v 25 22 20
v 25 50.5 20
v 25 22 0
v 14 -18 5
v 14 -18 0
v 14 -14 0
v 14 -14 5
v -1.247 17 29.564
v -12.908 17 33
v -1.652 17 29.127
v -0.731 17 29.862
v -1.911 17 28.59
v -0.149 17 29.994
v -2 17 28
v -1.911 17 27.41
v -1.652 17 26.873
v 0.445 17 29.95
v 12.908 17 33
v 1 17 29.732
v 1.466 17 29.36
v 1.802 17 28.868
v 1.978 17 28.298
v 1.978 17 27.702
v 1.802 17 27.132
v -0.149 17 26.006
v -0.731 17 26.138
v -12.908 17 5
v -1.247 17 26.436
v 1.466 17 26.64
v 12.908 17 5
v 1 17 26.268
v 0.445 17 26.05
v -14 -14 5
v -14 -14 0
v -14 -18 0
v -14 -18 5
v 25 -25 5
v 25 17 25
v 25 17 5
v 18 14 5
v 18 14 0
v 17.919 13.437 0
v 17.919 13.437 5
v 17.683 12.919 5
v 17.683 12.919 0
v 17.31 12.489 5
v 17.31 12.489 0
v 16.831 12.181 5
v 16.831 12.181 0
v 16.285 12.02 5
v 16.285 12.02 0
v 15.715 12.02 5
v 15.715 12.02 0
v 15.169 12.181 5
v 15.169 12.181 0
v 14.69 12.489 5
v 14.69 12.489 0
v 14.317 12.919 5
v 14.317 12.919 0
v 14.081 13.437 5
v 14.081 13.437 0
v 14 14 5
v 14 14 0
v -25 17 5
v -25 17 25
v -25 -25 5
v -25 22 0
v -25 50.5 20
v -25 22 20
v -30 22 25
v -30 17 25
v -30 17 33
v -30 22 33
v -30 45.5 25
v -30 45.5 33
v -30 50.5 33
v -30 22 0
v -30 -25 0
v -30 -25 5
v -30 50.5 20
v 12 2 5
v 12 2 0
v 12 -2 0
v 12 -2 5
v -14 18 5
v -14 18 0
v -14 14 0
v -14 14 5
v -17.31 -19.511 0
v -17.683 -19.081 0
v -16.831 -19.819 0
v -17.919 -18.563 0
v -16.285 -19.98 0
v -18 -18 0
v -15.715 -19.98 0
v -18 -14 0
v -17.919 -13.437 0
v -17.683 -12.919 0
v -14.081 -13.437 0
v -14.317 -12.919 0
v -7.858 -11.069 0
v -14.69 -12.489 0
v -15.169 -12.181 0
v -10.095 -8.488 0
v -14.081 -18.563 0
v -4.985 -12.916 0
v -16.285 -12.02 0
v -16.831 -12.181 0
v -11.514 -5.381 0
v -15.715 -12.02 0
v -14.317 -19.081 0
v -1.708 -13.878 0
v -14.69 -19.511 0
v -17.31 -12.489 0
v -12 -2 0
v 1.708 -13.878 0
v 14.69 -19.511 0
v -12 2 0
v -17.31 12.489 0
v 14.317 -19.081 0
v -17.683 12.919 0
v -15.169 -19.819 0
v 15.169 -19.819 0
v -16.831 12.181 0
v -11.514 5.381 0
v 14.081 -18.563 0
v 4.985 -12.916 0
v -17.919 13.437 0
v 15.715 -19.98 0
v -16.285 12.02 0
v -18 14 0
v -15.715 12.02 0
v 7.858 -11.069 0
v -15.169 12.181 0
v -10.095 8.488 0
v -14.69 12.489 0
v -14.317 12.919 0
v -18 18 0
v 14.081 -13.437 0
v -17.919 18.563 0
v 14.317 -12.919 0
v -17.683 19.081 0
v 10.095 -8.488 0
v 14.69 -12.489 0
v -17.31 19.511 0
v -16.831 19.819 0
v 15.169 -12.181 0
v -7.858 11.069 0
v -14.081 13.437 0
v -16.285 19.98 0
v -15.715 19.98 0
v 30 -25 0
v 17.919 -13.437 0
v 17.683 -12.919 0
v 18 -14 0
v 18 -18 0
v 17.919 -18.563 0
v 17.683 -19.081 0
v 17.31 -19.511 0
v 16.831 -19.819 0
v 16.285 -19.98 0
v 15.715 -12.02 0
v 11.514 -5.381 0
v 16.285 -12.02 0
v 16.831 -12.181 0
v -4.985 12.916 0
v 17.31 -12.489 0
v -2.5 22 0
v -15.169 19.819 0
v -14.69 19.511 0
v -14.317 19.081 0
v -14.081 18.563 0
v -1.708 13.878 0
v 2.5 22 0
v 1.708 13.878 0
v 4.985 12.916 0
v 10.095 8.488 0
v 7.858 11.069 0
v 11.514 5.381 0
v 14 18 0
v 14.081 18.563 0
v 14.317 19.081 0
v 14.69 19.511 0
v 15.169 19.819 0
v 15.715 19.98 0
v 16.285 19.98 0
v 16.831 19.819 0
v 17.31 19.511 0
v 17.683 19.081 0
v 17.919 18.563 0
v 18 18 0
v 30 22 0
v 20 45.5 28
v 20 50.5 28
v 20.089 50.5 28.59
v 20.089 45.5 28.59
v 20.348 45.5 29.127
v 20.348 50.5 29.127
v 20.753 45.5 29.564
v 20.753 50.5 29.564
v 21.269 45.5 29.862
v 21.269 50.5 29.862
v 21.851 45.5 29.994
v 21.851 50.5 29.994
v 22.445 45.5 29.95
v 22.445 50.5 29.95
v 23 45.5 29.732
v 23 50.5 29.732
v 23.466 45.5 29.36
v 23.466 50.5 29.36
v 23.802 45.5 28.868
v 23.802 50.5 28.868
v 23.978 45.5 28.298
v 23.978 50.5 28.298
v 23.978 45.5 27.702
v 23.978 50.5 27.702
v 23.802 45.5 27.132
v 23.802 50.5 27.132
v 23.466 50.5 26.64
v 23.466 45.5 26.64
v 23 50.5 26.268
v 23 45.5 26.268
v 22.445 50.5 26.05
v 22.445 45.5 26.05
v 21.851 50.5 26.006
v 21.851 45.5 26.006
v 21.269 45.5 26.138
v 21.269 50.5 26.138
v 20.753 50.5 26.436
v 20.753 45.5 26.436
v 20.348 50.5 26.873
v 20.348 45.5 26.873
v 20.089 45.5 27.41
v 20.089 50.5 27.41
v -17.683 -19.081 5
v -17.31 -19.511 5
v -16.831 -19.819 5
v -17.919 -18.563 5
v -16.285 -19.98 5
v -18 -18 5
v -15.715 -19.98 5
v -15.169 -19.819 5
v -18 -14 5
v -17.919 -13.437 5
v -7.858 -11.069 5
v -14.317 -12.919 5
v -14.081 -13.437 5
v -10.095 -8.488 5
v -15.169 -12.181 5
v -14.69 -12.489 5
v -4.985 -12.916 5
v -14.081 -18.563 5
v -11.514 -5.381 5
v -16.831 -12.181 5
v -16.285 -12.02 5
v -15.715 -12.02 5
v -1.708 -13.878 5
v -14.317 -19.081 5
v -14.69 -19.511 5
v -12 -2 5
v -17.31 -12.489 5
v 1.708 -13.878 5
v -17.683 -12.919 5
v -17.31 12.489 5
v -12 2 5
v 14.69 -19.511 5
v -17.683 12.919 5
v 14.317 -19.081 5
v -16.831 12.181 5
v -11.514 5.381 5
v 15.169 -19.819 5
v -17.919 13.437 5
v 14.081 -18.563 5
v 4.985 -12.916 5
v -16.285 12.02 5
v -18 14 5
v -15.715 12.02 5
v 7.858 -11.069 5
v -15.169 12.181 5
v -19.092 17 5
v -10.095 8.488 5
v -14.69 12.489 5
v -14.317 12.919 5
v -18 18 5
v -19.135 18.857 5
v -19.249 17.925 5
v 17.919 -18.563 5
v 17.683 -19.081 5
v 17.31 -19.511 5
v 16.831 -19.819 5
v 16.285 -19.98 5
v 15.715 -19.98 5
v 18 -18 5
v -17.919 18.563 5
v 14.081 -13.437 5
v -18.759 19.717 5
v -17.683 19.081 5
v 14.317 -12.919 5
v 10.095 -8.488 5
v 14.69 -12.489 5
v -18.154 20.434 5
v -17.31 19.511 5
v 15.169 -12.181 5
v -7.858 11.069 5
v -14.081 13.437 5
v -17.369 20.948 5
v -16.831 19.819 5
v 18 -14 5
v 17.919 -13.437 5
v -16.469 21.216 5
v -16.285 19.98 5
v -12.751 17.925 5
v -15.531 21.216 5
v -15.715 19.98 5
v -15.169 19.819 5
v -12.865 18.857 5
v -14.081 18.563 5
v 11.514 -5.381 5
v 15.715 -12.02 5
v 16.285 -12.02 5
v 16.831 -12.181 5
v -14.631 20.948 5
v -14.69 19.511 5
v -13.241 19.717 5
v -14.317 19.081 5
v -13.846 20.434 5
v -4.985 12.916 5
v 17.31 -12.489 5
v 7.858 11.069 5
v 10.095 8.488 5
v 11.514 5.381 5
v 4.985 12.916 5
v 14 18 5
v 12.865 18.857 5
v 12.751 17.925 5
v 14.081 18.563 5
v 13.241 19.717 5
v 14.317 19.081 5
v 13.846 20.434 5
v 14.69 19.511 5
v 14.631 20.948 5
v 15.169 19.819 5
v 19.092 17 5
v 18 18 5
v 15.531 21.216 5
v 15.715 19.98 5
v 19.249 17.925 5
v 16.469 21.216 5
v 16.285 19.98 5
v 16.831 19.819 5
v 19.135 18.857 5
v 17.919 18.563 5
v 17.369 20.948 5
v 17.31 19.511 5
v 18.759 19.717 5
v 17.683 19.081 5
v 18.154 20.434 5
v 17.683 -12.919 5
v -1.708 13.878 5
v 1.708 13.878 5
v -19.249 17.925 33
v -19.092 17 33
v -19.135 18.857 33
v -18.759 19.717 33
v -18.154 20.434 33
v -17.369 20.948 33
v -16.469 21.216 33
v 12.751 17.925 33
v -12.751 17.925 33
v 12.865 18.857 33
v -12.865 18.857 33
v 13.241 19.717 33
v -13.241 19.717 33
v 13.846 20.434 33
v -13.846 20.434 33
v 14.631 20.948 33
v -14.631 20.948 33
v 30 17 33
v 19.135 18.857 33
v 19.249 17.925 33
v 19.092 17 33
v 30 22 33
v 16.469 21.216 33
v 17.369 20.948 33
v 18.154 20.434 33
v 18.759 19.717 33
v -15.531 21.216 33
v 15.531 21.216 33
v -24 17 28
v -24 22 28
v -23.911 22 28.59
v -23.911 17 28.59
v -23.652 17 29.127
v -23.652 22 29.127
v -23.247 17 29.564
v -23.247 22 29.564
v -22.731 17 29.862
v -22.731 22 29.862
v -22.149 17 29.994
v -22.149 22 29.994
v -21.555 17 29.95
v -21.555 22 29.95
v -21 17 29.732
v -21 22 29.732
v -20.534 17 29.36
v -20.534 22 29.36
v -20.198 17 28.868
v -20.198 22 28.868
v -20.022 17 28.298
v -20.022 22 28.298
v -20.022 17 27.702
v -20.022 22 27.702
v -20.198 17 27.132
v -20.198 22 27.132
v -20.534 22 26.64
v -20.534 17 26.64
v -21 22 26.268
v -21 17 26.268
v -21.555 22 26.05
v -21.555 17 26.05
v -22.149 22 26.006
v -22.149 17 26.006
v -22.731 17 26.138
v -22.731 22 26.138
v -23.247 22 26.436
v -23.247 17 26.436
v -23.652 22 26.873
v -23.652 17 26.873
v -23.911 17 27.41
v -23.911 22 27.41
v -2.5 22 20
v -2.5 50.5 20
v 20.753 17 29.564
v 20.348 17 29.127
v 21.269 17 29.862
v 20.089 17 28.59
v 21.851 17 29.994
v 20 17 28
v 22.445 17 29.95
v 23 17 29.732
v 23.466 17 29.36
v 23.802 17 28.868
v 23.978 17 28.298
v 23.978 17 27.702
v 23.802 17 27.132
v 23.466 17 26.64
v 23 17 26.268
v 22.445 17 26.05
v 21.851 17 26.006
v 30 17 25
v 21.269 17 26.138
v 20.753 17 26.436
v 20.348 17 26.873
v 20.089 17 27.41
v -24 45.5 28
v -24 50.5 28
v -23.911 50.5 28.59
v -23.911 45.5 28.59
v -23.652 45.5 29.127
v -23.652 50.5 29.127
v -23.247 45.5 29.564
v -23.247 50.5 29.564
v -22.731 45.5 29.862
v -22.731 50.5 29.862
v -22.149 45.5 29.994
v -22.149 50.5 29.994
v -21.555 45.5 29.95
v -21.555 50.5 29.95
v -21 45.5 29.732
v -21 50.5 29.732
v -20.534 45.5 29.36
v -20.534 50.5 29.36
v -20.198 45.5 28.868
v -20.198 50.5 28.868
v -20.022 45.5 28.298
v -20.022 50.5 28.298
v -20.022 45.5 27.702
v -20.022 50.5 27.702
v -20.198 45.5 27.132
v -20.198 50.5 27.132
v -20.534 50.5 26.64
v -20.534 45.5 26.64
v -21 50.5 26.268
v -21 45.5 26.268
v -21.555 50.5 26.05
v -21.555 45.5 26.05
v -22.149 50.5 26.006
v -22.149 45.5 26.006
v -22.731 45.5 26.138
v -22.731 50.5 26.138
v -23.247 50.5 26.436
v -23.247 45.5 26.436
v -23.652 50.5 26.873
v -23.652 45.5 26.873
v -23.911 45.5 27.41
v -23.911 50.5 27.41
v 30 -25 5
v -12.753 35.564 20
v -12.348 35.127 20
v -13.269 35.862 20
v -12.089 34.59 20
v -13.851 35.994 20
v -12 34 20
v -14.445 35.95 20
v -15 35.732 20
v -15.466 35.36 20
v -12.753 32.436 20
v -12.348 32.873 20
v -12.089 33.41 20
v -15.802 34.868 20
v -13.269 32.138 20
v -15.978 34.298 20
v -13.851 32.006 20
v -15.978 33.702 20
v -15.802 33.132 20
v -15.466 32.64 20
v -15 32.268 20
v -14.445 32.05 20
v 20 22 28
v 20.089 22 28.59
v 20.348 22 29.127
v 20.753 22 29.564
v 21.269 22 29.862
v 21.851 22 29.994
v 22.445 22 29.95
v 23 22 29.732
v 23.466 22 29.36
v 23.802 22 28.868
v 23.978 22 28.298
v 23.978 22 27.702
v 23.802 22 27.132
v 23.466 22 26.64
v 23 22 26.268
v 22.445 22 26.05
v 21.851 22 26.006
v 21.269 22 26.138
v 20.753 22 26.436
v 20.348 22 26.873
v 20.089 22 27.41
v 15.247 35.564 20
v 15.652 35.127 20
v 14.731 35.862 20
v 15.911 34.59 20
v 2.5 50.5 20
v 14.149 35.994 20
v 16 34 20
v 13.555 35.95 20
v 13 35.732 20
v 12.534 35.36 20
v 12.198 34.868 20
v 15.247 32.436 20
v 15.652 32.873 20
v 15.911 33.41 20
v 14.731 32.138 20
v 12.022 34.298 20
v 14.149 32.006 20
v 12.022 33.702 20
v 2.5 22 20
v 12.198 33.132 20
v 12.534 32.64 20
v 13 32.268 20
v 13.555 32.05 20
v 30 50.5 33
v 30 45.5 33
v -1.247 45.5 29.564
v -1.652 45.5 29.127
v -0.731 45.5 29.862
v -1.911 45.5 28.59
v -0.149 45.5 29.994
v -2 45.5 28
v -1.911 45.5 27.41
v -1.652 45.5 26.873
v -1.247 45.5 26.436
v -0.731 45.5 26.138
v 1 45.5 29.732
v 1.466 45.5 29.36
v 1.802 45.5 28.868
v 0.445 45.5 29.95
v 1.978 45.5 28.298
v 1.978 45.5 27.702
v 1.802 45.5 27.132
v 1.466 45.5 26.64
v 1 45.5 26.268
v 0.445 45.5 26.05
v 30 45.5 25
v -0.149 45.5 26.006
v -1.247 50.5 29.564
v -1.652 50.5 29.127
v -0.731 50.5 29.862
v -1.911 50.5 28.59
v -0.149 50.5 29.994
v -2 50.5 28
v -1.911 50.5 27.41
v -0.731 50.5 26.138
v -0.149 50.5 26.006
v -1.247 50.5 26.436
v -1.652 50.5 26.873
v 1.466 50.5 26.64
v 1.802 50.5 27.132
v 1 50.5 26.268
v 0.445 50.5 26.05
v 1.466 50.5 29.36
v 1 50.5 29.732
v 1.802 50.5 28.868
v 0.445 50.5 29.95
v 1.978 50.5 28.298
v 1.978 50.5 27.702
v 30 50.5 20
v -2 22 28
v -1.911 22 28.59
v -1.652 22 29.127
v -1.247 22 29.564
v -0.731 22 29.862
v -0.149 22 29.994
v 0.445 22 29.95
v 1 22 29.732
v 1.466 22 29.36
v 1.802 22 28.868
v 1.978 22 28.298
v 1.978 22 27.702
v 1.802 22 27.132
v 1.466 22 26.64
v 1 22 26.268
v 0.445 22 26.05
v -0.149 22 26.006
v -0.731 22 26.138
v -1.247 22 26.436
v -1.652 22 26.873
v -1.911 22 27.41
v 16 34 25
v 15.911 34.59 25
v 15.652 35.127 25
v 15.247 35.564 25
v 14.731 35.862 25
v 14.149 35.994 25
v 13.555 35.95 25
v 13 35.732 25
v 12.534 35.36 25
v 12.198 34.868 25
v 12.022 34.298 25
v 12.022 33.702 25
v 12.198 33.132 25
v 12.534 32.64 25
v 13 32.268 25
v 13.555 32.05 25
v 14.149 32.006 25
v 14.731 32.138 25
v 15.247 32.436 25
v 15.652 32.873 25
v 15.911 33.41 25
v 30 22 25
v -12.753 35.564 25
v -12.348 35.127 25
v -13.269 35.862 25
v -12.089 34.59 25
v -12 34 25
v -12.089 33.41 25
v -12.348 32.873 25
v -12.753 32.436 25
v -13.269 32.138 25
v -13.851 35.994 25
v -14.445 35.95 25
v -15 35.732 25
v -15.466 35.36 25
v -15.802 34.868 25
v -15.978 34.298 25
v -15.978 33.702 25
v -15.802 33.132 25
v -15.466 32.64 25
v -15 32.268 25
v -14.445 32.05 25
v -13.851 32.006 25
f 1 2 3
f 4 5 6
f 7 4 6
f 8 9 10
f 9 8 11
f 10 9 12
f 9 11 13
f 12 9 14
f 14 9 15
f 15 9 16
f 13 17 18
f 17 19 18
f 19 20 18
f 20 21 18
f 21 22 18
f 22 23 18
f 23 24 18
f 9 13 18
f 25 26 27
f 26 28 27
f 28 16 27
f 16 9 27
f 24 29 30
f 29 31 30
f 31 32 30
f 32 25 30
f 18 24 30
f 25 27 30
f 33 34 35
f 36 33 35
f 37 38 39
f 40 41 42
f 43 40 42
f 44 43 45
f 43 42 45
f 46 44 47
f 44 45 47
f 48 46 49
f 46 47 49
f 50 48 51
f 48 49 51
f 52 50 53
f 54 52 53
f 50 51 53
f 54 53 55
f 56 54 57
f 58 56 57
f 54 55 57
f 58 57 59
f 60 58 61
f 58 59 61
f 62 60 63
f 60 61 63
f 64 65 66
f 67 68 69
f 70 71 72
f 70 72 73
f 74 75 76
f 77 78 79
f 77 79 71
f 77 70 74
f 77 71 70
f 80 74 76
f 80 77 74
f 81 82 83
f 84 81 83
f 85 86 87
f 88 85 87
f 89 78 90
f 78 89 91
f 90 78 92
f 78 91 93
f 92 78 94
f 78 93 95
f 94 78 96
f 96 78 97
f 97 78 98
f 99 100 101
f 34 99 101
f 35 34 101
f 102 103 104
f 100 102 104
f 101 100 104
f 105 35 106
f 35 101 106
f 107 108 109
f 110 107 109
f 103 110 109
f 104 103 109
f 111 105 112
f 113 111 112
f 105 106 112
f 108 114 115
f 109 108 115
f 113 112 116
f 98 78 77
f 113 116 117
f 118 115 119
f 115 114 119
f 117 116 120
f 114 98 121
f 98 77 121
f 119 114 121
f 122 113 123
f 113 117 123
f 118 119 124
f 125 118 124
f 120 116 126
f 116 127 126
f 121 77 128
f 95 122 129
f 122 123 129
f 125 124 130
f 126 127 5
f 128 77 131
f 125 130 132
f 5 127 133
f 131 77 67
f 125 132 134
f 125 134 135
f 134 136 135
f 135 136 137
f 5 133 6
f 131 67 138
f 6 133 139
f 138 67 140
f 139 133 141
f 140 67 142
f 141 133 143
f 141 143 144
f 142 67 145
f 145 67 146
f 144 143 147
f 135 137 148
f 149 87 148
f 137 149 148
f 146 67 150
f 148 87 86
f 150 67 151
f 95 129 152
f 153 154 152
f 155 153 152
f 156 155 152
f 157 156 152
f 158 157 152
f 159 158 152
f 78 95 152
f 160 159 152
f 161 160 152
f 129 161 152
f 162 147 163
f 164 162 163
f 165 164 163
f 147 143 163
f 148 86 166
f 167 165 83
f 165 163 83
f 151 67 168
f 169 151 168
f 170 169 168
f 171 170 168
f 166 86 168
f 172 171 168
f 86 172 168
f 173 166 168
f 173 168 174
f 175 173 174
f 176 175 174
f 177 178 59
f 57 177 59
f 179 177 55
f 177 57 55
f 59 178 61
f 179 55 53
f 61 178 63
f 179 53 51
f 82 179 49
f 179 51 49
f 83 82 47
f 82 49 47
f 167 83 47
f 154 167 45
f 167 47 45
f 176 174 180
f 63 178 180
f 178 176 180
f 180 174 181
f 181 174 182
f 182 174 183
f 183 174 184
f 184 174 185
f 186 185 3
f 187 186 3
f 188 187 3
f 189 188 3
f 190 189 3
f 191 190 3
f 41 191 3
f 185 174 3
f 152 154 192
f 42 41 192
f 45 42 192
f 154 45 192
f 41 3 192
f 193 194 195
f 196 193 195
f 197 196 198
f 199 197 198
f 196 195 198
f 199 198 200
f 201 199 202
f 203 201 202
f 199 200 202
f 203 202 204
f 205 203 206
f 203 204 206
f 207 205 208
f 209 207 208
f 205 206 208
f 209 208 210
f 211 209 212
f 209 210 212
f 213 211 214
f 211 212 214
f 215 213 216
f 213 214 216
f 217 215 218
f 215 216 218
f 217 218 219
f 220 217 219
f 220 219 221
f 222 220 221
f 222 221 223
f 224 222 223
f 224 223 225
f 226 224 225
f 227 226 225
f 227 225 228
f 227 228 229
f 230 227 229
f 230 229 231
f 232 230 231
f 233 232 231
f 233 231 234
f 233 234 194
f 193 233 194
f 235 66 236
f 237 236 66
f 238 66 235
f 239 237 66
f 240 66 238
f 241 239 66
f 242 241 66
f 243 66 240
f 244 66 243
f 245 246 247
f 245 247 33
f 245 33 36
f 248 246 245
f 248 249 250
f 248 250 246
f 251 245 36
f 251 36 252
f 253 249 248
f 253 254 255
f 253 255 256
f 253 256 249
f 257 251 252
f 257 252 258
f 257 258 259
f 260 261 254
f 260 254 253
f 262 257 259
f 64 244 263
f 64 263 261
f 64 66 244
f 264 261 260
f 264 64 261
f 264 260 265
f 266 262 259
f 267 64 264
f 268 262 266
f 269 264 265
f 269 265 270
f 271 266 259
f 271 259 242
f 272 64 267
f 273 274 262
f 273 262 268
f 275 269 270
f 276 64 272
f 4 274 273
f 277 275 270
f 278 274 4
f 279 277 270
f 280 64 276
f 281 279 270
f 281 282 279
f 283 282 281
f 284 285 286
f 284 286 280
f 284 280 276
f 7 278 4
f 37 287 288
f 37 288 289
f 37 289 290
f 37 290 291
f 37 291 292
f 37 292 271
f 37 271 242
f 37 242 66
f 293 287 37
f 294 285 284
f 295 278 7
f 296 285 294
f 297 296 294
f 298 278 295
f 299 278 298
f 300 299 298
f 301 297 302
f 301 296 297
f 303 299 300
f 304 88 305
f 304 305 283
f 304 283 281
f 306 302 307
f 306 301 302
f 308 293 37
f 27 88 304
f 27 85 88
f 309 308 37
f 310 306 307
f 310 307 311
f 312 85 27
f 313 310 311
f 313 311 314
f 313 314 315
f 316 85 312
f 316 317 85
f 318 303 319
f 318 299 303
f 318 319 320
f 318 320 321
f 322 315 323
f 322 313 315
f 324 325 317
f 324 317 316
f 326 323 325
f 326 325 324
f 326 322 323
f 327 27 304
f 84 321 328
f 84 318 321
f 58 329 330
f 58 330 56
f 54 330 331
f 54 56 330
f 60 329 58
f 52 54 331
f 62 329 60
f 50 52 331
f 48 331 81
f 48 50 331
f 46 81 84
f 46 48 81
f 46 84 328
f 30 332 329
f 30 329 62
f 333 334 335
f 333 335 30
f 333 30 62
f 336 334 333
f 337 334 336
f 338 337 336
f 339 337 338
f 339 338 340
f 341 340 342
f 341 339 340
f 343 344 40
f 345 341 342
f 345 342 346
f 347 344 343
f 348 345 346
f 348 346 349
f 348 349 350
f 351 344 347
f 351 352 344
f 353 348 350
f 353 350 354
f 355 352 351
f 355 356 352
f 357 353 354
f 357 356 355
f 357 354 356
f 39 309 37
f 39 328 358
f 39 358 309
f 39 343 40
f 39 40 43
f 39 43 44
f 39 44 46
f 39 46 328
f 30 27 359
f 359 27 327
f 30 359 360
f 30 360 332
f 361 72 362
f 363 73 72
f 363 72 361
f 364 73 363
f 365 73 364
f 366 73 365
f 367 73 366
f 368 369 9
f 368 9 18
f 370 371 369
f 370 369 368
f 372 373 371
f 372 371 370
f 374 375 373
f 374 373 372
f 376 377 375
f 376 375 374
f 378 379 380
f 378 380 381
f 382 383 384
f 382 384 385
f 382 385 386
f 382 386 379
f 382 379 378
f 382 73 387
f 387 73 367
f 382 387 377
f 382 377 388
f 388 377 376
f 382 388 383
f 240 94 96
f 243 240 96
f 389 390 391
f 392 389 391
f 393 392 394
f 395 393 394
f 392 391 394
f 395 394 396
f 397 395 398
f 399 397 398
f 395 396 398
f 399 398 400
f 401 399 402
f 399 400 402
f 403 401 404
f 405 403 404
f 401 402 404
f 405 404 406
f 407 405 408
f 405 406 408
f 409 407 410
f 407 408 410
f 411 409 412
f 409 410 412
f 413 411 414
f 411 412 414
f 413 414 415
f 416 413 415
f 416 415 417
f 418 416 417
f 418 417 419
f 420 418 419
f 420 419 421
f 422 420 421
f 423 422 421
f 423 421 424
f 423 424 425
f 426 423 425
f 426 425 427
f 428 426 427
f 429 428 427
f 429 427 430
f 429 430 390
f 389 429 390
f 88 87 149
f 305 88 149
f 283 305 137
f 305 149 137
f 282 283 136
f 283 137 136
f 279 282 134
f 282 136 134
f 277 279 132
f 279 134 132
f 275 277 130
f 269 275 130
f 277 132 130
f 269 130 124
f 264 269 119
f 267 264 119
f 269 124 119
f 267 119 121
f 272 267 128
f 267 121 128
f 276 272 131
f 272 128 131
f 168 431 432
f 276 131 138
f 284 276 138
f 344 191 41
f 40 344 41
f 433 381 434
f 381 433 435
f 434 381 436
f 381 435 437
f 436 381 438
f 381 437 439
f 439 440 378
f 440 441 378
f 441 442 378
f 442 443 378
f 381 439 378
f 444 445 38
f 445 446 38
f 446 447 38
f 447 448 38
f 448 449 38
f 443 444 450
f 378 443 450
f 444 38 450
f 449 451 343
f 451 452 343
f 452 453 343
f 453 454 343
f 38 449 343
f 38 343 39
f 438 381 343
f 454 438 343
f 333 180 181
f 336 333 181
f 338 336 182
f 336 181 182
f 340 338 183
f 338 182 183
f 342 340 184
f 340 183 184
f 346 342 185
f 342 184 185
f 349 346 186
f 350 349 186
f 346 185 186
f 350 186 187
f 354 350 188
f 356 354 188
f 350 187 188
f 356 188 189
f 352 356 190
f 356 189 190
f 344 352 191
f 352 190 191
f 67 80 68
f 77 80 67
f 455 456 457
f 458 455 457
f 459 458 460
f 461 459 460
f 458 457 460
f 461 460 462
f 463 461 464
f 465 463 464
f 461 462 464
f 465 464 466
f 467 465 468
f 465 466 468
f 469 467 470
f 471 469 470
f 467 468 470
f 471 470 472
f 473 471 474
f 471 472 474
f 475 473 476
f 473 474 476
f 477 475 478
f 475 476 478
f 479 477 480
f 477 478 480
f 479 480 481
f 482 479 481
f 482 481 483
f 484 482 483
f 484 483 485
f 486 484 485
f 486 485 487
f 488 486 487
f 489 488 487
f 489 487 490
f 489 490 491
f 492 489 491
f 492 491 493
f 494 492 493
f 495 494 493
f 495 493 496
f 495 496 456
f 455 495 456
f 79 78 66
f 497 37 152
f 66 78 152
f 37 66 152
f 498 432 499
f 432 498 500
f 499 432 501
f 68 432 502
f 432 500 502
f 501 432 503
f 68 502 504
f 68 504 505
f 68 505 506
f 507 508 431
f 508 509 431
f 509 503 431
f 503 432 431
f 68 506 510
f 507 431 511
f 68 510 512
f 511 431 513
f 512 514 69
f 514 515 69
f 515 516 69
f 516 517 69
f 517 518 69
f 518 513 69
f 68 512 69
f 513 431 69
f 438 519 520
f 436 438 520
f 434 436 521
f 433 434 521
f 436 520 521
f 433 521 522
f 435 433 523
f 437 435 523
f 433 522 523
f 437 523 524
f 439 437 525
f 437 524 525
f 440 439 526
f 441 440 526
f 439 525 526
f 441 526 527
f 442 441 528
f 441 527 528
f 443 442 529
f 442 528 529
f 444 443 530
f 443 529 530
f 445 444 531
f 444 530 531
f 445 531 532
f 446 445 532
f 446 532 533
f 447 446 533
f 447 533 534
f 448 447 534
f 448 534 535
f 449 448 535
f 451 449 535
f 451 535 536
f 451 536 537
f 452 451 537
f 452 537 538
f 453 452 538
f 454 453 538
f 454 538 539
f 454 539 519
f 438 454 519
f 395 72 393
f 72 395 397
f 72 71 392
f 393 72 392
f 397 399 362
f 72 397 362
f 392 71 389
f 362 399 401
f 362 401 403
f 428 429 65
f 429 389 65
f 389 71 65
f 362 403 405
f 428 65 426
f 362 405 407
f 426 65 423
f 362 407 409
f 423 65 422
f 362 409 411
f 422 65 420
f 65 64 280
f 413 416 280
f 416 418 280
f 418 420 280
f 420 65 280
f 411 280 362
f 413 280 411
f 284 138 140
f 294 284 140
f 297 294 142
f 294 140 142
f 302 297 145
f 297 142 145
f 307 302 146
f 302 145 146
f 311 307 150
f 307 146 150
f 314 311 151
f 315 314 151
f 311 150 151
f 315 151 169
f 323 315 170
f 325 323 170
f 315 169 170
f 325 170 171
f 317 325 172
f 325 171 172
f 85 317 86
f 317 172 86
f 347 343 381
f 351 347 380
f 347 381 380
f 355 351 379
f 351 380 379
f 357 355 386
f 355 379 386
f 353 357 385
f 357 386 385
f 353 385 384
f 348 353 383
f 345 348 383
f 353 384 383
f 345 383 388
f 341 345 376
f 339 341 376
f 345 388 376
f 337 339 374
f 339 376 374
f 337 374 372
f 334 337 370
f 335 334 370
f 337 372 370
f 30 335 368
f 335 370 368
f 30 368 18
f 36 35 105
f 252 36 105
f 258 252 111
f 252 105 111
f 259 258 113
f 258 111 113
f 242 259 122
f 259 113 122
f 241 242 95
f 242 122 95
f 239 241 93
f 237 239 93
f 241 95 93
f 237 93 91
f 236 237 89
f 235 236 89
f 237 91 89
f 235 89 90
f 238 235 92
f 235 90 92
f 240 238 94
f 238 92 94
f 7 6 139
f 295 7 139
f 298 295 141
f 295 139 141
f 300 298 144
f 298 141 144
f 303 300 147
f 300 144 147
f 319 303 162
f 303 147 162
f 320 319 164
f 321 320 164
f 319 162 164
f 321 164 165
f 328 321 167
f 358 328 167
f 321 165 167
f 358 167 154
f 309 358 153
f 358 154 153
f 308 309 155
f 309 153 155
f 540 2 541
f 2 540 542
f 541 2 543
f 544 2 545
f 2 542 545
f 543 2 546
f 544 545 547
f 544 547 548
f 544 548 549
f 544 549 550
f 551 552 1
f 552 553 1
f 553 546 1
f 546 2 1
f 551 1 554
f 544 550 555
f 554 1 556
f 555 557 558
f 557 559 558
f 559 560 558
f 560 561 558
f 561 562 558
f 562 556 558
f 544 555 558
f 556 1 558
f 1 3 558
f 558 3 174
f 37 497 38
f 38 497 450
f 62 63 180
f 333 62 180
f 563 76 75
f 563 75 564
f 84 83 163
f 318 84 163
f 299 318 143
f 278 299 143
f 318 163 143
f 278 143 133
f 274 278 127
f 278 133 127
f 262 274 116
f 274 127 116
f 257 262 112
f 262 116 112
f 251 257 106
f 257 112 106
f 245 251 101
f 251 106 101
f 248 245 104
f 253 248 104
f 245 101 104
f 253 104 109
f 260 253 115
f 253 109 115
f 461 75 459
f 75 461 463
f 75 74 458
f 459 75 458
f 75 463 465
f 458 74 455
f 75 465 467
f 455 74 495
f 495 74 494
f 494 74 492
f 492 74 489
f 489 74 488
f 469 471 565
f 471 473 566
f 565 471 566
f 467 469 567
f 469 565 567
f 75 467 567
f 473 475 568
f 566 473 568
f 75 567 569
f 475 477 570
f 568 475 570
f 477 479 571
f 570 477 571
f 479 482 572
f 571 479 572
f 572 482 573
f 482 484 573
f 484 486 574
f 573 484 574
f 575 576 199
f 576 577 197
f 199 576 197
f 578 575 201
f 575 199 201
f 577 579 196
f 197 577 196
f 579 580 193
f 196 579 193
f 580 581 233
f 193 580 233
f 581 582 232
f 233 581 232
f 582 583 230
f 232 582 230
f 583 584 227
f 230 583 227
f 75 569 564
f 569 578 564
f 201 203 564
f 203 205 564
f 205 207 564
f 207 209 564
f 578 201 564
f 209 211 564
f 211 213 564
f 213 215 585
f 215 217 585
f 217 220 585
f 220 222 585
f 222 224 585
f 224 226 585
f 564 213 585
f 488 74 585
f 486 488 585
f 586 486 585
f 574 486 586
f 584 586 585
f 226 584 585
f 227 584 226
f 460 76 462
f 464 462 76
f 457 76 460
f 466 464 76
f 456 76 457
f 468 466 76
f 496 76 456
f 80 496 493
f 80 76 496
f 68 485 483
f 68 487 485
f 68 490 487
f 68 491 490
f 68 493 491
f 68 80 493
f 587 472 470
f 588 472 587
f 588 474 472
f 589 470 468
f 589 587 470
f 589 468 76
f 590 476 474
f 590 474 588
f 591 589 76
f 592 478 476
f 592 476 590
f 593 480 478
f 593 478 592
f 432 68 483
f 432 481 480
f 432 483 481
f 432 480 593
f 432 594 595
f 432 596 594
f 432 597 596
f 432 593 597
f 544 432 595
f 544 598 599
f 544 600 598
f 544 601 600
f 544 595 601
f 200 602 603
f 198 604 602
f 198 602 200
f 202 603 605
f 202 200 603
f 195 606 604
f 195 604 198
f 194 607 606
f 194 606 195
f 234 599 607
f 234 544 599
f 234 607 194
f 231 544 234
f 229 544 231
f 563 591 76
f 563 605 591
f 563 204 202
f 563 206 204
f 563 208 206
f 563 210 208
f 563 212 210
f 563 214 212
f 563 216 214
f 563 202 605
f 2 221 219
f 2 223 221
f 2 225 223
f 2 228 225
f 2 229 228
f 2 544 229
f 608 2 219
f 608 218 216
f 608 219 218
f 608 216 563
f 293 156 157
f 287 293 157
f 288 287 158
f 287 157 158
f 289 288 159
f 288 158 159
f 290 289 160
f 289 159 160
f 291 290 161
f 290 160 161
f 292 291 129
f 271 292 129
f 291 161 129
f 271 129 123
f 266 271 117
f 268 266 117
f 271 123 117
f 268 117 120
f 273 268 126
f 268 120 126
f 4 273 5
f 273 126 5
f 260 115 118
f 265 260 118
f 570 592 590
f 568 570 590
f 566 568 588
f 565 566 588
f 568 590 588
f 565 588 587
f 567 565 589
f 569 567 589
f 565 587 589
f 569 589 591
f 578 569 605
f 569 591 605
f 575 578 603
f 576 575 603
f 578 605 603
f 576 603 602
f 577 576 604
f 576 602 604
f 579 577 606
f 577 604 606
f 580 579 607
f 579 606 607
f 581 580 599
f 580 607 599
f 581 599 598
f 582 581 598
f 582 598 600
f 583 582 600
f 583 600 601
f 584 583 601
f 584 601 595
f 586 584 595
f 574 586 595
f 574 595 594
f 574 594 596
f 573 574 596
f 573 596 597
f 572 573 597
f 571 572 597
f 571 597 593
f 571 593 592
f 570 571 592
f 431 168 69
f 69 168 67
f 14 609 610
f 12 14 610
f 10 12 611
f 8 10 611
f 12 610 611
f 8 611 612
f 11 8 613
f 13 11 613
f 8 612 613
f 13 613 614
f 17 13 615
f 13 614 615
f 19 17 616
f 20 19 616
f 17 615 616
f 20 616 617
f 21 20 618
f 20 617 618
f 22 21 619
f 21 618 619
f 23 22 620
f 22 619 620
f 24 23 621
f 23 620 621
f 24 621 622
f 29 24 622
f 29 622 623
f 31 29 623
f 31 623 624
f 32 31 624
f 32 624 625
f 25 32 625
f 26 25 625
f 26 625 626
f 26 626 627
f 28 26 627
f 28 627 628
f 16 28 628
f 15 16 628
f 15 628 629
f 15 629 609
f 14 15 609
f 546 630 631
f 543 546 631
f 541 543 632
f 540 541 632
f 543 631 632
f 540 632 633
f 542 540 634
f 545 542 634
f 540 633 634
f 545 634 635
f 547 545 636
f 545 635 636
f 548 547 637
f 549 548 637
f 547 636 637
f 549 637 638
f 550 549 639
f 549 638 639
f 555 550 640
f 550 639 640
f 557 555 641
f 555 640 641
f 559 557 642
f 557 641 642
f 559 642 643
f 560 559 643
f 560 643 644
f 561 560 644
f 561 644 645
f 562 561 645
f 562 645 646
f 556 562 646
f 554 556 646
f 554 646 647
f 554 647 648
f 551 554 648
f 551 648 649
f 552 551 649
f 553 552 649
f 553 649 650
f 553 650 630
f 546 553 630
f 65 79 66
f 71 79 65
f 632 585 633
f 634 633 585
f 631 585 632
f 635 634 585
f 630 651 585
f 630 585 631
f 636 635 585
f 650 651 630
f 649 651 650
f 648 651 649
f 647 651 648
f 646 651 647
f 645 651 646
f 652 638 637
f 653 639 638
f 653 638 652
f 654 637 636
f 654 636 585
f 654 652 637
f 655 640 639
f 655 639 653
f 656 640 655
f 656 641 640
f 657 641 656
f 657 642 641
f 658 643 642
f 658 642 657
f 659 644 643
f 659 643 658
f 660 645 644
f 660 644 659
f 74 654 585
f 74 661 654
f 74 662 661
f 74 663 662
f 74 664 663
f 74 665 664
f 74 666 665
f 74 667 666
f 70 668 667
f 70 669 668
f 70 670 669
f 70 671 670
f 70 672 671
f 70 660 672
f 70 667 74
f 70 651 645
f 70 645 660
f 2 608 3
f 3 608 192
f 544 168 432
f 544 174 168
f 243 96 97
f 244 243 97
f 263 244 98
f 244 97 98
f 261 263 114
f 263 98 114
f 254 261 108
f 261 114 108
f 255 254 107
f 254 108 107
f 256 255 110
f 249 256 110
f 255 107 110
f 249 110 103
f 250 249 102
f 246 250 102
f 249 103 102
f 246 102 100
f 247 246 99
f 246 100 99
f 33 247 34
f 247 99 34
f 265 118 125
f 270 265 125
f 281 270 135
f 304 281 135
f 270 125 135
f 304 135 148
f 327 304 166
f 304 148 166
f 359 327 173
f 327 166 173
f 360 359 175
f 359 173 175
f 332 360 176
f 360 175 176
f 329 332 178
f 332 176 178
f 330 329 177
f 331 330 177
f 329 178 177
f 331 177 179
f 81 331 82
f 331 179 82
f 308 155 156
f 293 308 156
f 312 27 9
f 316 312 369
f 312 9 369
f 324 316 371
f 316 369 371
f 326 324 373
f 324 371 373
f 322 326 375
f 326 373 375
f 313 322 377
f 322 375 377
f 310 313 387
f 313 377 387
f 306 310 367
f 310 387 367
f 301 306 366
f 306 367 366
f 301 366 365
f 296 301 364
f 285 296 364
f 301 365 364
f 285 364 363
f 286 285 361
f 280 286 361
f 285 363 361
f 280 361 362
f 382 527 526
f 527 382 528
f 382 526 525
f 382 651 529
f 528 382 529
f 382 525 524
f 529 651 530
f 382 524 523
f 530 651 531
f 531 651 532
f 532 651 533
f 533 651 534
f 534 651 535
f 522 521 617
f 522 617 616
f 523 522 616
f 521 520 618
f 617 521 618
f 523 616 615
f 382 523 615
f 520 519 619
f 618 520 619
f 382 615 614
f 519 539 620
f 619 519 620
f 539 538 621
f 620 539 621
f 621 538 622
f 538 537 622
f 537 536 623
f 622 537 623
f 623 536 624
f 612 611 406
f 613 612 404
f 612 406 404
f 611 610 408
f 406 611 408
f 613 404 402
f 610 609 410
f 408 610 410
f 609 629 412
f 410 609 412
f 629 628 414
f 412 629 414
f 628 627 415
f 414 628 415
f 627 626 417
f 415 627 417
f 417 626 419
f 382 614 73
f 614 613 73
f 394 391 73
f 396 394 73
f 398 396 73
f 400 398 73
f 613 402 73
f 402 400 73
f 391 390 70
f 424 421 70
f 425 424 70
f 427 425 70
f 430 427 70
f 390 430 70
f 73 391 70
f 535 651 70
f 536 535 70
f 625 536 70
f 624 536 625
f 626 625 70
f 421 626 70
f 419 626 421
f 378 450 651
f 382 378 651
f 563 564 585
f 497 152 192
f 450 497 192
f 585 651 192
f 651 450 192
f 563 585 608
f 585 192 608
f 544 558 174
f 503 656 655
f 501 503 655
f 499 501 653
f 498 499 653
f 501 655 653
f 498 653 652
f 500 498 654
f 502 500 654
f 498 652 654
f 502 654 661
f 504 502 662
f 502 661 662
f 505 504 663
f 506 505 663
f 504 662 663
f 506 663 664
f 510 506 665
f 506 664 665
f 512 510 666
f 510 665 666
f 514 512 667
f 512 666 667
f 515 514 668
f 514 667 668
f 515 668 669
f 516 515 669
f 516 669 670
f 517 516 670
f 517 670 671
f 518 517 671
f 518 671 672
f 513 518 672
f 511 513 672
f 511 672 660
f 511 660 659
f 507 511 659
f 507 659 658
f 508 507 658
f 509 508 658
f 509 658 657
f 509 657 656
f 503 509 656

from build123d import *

# Parameters (mm, degrees)
F0_W           = 60
F0_H           = 47
F1_DEPTH       = 5
F3_DEPTH       = 20
F4_W           = 60
F4_H           = 5
F5_DEPTH       = 28.5
F7_DEPTH       = 5
F9_DEPTH       = 8
F10_W          = 60
F10_H          = 5
F11_DEPTH      = 8
F12_R          = 2
F13_DEPTH      = 25
F15_DEPTH      = 2.5
F15_DEPTH_BACK = 2.5
F16_R          = 2
F17_DEPTH      = 75.501
F18_R          = 3.25
F19_DEPTH      = 28
F20_DEPTH      = 138


# Not quite as in the source:
# - an extrude ends at something that could not be found from the text; its depth is read off the source's solid
# - a pattern or mirror of a feature is missing from the dataset's text; its kind, count and spacing are read off the source's solid
# - a feature names something its author has since deleted; it is built from what else it names


with BuildPart() as f1:
    # F0 (on Top) → F1 (new body)
    with BuildSketch(Plane.XY):
        with Locations((0, -1.5)):
            Rectangle(F0_W, F0_H)
        with BuildLine():
            Line((-14, -14), (-14, -18))
            ThreePointArc((-14, -18), (-16, -20), (-18, -18))
            Line((-18, -18), (-18, -14))
            ThreePointArc((-18, -14), (-16, -12), (-14, -14))
        make_face(mode=Mode.SUBTRACT)
        with BuildLine():
            Line((18, -14), (18, -18))
            ThreePointArc((18, -18), (16, -20), (14, -18))
            Line((14, -18), (14, -14))
            ThreePointArc((14, -14), (16, -12), (18, -14))
        make_face(mode=Mode.SUBTRACT)
        with BuildLine():
            ThreePointArc((-14, 14), (-16, 12), (-18, 14))
            Line((-18, 14), (-18, 18))
            ThreePointArc((-18, 18), (-16, 20), (-14, 18))
            Line((-14, 18), (-14, 14))
        make_face(mode=Mode.SUBTRACT)
        with BuildLine():
            Line((-12, -2), (-12, 2))
            ThreePointArc((-12, 2), (0, 14), (12, 2))
            Line((12, 2), (12, -2))
            ThreePointArc((12, -2), (0, -14), (-12, -2))
        make_face(mode=Mode.SUBTRACT)
        with BuildLine():
            Line((14, 14), (14, 18))
            ThreePointArc((14, 18), (16, 20), (18, 18))
            Line((18, 18), (18, 14))
            ThreePointArc((18, 14), (16, 12), (14, 14))
        make_face(mode=Mode.SUBTRACT)
    extrude(amount=F1_DEPTH)

    # F2 (on face) → F3 (join)
    with BuildSketch(Plane.XY.offset(5)):
        with BuildLine():
            Line((30, 22), (-30, 22))
            Line((-30, 22), (-30, 17))
            Line((-30, 17), (-18, 17))
            Line((-18, 17), (-18, 18))
            ThreePointArc((-18, 18), (-16, 20), (-14, 18))
            Line((-14, 18), (-14, 17))
            Line((-14, 17), (14, 17))
            Line((14, 17), (14, 18))
            ThreePointArc((14, 18), (16, 20), (18, 18))
            Line((18, 18), (18, 17))
            Line((18, 17), (30, 17))
            Line((30, 17), (30, 22))
        make_face()
    extrude(amount=F3_DEPTH)

    # F4 (on face) → F5 (join)
    with BuildSketch(Plane(origin=(0, 22, 0), x_dir=(-1, 0, 0), z_dir=(0, 1, 0))):
        with Locations((0, 22.5)):
            Rectangle(F4_W, F4_H)
    extrude(amount=F5_DEPTH)

    # F6 (on face) → F7 (join)
    with BuildSketch(Plane(origin=(-30, 0, 0), x_dir=(0, -1, 0), z_dir=(-1, 0, 0))):
        Polygon((-22, 20), (-50.5, 20), (-22, 0), align=None)
        Polygon((25, 5), (-17, 25), (-17, 5), align=None)
    f7 = extrude(amount=-F7_DEPTH)

    # F7_copies: F7 across plane
    add(f7.mirror(Plane(origin=(0, 0, 0), x_dir=(0, 0, 1), z_dir=(1, 0, 0))))

    # F8 (on face) → F9 (join)
    with BuildSketch(Plane.XY.offset(25)):
        with BuildLine():
            Line((30, 22), (-30, 22))
            Line((-30, 22), (-30, 17))
            Line((-30, 17), (-25, 17))
            Line((-25, 17), (-18, 17))
            Line((-18, 17), (-18, 18))
            ThreePointArc((-18, 18), (-16, 20), (-14, 18))
            Line((-14, 18), (-14, 17))
            Line((-14, 17), (14, 17))
            Line((14, 17), (14, 18))
            ThreePointArc((14, 18), (16, 20), (18, 18))
            Line((18, 18), (18, 17))
            Line((18, 17), (25, 17))
            Line((25, 17), (30, 17))
            Line((30, 17), (30, 22))
        make_face()
    extrude(amount=F9_DEPTH)

    # F10 (on face) → F11 (join)
    with BuildSketch(Plane.XY.offset(25)):
        with Locations((0, 48)):
            Rectangle(F10_W, F10_H)
    extrude(amount=F11_DEPTH)

    # F12 (on face) → F13 (cut)
    with BuildSketch(Plane.XY.offset(25)):
        with Locations((14, 34)):
            Circle(F12_R)
        with Locations((-14, 34)):
            Circle(F12_R)
    extrude(amount=-F13_DEPTH, mode=Mode.SUBTRACT)

    # F14 (on Right) → F15 (join, two sides)
    with BuildSketch(Plane.YZ) as f15_sk:
        Polygon((22, 20), (22, 0), (50.5, 20), align=None)
    extrude(amount=F15_DEPTH)
    extrude(f15_sk.sketch, amount=-F15_DEPTH_BACK)

    # F16 (on face) → F17 (cut, through all)
    with BuildSketch(Plane(origin=(0, 50.5, 0), x_dir=(-1, 0, 0), z_dir=(0, 1, 0))):
        with Locations((-22, 28)):
            Circle(F16_R)
        with Locations((22, 28)):
            Circle(F16_R)
        with Locations((0, 28)):
            Circle(F16_R)
    extrude(amount=-F17_DEPTH, mode=Mode.SUBTRACT)

    # F18 (on face) → F19 (cut, through all)
    with BuildSketch(Plane.XY.offset(33)):
        with Locations((-16, 18)):
            Circle(F18_R)
        with Locations((16, 18)):
            Circle(F18_R)
    extrude(amount=-F19_DEPTH, mode=Mode.SUBTRACT)

    # F16 (on face) → F20 (cut, through all)
    with BuildSketch(Plane(origin=(0, 50.5, 0), x_dir=(-1, 0, 0), z_dir=(0, 1, 0))):
        with Locations((-22, 28)):
            Circle(F16_R)
        with Locations((22, 28)):
            Circle(F16_R)
        with Locations((0, 28)):
            Circle(F16_R)
    extrude(amount=F20_DEPTH, mode=Mode.SUBTRACT)


solid = f1.part
